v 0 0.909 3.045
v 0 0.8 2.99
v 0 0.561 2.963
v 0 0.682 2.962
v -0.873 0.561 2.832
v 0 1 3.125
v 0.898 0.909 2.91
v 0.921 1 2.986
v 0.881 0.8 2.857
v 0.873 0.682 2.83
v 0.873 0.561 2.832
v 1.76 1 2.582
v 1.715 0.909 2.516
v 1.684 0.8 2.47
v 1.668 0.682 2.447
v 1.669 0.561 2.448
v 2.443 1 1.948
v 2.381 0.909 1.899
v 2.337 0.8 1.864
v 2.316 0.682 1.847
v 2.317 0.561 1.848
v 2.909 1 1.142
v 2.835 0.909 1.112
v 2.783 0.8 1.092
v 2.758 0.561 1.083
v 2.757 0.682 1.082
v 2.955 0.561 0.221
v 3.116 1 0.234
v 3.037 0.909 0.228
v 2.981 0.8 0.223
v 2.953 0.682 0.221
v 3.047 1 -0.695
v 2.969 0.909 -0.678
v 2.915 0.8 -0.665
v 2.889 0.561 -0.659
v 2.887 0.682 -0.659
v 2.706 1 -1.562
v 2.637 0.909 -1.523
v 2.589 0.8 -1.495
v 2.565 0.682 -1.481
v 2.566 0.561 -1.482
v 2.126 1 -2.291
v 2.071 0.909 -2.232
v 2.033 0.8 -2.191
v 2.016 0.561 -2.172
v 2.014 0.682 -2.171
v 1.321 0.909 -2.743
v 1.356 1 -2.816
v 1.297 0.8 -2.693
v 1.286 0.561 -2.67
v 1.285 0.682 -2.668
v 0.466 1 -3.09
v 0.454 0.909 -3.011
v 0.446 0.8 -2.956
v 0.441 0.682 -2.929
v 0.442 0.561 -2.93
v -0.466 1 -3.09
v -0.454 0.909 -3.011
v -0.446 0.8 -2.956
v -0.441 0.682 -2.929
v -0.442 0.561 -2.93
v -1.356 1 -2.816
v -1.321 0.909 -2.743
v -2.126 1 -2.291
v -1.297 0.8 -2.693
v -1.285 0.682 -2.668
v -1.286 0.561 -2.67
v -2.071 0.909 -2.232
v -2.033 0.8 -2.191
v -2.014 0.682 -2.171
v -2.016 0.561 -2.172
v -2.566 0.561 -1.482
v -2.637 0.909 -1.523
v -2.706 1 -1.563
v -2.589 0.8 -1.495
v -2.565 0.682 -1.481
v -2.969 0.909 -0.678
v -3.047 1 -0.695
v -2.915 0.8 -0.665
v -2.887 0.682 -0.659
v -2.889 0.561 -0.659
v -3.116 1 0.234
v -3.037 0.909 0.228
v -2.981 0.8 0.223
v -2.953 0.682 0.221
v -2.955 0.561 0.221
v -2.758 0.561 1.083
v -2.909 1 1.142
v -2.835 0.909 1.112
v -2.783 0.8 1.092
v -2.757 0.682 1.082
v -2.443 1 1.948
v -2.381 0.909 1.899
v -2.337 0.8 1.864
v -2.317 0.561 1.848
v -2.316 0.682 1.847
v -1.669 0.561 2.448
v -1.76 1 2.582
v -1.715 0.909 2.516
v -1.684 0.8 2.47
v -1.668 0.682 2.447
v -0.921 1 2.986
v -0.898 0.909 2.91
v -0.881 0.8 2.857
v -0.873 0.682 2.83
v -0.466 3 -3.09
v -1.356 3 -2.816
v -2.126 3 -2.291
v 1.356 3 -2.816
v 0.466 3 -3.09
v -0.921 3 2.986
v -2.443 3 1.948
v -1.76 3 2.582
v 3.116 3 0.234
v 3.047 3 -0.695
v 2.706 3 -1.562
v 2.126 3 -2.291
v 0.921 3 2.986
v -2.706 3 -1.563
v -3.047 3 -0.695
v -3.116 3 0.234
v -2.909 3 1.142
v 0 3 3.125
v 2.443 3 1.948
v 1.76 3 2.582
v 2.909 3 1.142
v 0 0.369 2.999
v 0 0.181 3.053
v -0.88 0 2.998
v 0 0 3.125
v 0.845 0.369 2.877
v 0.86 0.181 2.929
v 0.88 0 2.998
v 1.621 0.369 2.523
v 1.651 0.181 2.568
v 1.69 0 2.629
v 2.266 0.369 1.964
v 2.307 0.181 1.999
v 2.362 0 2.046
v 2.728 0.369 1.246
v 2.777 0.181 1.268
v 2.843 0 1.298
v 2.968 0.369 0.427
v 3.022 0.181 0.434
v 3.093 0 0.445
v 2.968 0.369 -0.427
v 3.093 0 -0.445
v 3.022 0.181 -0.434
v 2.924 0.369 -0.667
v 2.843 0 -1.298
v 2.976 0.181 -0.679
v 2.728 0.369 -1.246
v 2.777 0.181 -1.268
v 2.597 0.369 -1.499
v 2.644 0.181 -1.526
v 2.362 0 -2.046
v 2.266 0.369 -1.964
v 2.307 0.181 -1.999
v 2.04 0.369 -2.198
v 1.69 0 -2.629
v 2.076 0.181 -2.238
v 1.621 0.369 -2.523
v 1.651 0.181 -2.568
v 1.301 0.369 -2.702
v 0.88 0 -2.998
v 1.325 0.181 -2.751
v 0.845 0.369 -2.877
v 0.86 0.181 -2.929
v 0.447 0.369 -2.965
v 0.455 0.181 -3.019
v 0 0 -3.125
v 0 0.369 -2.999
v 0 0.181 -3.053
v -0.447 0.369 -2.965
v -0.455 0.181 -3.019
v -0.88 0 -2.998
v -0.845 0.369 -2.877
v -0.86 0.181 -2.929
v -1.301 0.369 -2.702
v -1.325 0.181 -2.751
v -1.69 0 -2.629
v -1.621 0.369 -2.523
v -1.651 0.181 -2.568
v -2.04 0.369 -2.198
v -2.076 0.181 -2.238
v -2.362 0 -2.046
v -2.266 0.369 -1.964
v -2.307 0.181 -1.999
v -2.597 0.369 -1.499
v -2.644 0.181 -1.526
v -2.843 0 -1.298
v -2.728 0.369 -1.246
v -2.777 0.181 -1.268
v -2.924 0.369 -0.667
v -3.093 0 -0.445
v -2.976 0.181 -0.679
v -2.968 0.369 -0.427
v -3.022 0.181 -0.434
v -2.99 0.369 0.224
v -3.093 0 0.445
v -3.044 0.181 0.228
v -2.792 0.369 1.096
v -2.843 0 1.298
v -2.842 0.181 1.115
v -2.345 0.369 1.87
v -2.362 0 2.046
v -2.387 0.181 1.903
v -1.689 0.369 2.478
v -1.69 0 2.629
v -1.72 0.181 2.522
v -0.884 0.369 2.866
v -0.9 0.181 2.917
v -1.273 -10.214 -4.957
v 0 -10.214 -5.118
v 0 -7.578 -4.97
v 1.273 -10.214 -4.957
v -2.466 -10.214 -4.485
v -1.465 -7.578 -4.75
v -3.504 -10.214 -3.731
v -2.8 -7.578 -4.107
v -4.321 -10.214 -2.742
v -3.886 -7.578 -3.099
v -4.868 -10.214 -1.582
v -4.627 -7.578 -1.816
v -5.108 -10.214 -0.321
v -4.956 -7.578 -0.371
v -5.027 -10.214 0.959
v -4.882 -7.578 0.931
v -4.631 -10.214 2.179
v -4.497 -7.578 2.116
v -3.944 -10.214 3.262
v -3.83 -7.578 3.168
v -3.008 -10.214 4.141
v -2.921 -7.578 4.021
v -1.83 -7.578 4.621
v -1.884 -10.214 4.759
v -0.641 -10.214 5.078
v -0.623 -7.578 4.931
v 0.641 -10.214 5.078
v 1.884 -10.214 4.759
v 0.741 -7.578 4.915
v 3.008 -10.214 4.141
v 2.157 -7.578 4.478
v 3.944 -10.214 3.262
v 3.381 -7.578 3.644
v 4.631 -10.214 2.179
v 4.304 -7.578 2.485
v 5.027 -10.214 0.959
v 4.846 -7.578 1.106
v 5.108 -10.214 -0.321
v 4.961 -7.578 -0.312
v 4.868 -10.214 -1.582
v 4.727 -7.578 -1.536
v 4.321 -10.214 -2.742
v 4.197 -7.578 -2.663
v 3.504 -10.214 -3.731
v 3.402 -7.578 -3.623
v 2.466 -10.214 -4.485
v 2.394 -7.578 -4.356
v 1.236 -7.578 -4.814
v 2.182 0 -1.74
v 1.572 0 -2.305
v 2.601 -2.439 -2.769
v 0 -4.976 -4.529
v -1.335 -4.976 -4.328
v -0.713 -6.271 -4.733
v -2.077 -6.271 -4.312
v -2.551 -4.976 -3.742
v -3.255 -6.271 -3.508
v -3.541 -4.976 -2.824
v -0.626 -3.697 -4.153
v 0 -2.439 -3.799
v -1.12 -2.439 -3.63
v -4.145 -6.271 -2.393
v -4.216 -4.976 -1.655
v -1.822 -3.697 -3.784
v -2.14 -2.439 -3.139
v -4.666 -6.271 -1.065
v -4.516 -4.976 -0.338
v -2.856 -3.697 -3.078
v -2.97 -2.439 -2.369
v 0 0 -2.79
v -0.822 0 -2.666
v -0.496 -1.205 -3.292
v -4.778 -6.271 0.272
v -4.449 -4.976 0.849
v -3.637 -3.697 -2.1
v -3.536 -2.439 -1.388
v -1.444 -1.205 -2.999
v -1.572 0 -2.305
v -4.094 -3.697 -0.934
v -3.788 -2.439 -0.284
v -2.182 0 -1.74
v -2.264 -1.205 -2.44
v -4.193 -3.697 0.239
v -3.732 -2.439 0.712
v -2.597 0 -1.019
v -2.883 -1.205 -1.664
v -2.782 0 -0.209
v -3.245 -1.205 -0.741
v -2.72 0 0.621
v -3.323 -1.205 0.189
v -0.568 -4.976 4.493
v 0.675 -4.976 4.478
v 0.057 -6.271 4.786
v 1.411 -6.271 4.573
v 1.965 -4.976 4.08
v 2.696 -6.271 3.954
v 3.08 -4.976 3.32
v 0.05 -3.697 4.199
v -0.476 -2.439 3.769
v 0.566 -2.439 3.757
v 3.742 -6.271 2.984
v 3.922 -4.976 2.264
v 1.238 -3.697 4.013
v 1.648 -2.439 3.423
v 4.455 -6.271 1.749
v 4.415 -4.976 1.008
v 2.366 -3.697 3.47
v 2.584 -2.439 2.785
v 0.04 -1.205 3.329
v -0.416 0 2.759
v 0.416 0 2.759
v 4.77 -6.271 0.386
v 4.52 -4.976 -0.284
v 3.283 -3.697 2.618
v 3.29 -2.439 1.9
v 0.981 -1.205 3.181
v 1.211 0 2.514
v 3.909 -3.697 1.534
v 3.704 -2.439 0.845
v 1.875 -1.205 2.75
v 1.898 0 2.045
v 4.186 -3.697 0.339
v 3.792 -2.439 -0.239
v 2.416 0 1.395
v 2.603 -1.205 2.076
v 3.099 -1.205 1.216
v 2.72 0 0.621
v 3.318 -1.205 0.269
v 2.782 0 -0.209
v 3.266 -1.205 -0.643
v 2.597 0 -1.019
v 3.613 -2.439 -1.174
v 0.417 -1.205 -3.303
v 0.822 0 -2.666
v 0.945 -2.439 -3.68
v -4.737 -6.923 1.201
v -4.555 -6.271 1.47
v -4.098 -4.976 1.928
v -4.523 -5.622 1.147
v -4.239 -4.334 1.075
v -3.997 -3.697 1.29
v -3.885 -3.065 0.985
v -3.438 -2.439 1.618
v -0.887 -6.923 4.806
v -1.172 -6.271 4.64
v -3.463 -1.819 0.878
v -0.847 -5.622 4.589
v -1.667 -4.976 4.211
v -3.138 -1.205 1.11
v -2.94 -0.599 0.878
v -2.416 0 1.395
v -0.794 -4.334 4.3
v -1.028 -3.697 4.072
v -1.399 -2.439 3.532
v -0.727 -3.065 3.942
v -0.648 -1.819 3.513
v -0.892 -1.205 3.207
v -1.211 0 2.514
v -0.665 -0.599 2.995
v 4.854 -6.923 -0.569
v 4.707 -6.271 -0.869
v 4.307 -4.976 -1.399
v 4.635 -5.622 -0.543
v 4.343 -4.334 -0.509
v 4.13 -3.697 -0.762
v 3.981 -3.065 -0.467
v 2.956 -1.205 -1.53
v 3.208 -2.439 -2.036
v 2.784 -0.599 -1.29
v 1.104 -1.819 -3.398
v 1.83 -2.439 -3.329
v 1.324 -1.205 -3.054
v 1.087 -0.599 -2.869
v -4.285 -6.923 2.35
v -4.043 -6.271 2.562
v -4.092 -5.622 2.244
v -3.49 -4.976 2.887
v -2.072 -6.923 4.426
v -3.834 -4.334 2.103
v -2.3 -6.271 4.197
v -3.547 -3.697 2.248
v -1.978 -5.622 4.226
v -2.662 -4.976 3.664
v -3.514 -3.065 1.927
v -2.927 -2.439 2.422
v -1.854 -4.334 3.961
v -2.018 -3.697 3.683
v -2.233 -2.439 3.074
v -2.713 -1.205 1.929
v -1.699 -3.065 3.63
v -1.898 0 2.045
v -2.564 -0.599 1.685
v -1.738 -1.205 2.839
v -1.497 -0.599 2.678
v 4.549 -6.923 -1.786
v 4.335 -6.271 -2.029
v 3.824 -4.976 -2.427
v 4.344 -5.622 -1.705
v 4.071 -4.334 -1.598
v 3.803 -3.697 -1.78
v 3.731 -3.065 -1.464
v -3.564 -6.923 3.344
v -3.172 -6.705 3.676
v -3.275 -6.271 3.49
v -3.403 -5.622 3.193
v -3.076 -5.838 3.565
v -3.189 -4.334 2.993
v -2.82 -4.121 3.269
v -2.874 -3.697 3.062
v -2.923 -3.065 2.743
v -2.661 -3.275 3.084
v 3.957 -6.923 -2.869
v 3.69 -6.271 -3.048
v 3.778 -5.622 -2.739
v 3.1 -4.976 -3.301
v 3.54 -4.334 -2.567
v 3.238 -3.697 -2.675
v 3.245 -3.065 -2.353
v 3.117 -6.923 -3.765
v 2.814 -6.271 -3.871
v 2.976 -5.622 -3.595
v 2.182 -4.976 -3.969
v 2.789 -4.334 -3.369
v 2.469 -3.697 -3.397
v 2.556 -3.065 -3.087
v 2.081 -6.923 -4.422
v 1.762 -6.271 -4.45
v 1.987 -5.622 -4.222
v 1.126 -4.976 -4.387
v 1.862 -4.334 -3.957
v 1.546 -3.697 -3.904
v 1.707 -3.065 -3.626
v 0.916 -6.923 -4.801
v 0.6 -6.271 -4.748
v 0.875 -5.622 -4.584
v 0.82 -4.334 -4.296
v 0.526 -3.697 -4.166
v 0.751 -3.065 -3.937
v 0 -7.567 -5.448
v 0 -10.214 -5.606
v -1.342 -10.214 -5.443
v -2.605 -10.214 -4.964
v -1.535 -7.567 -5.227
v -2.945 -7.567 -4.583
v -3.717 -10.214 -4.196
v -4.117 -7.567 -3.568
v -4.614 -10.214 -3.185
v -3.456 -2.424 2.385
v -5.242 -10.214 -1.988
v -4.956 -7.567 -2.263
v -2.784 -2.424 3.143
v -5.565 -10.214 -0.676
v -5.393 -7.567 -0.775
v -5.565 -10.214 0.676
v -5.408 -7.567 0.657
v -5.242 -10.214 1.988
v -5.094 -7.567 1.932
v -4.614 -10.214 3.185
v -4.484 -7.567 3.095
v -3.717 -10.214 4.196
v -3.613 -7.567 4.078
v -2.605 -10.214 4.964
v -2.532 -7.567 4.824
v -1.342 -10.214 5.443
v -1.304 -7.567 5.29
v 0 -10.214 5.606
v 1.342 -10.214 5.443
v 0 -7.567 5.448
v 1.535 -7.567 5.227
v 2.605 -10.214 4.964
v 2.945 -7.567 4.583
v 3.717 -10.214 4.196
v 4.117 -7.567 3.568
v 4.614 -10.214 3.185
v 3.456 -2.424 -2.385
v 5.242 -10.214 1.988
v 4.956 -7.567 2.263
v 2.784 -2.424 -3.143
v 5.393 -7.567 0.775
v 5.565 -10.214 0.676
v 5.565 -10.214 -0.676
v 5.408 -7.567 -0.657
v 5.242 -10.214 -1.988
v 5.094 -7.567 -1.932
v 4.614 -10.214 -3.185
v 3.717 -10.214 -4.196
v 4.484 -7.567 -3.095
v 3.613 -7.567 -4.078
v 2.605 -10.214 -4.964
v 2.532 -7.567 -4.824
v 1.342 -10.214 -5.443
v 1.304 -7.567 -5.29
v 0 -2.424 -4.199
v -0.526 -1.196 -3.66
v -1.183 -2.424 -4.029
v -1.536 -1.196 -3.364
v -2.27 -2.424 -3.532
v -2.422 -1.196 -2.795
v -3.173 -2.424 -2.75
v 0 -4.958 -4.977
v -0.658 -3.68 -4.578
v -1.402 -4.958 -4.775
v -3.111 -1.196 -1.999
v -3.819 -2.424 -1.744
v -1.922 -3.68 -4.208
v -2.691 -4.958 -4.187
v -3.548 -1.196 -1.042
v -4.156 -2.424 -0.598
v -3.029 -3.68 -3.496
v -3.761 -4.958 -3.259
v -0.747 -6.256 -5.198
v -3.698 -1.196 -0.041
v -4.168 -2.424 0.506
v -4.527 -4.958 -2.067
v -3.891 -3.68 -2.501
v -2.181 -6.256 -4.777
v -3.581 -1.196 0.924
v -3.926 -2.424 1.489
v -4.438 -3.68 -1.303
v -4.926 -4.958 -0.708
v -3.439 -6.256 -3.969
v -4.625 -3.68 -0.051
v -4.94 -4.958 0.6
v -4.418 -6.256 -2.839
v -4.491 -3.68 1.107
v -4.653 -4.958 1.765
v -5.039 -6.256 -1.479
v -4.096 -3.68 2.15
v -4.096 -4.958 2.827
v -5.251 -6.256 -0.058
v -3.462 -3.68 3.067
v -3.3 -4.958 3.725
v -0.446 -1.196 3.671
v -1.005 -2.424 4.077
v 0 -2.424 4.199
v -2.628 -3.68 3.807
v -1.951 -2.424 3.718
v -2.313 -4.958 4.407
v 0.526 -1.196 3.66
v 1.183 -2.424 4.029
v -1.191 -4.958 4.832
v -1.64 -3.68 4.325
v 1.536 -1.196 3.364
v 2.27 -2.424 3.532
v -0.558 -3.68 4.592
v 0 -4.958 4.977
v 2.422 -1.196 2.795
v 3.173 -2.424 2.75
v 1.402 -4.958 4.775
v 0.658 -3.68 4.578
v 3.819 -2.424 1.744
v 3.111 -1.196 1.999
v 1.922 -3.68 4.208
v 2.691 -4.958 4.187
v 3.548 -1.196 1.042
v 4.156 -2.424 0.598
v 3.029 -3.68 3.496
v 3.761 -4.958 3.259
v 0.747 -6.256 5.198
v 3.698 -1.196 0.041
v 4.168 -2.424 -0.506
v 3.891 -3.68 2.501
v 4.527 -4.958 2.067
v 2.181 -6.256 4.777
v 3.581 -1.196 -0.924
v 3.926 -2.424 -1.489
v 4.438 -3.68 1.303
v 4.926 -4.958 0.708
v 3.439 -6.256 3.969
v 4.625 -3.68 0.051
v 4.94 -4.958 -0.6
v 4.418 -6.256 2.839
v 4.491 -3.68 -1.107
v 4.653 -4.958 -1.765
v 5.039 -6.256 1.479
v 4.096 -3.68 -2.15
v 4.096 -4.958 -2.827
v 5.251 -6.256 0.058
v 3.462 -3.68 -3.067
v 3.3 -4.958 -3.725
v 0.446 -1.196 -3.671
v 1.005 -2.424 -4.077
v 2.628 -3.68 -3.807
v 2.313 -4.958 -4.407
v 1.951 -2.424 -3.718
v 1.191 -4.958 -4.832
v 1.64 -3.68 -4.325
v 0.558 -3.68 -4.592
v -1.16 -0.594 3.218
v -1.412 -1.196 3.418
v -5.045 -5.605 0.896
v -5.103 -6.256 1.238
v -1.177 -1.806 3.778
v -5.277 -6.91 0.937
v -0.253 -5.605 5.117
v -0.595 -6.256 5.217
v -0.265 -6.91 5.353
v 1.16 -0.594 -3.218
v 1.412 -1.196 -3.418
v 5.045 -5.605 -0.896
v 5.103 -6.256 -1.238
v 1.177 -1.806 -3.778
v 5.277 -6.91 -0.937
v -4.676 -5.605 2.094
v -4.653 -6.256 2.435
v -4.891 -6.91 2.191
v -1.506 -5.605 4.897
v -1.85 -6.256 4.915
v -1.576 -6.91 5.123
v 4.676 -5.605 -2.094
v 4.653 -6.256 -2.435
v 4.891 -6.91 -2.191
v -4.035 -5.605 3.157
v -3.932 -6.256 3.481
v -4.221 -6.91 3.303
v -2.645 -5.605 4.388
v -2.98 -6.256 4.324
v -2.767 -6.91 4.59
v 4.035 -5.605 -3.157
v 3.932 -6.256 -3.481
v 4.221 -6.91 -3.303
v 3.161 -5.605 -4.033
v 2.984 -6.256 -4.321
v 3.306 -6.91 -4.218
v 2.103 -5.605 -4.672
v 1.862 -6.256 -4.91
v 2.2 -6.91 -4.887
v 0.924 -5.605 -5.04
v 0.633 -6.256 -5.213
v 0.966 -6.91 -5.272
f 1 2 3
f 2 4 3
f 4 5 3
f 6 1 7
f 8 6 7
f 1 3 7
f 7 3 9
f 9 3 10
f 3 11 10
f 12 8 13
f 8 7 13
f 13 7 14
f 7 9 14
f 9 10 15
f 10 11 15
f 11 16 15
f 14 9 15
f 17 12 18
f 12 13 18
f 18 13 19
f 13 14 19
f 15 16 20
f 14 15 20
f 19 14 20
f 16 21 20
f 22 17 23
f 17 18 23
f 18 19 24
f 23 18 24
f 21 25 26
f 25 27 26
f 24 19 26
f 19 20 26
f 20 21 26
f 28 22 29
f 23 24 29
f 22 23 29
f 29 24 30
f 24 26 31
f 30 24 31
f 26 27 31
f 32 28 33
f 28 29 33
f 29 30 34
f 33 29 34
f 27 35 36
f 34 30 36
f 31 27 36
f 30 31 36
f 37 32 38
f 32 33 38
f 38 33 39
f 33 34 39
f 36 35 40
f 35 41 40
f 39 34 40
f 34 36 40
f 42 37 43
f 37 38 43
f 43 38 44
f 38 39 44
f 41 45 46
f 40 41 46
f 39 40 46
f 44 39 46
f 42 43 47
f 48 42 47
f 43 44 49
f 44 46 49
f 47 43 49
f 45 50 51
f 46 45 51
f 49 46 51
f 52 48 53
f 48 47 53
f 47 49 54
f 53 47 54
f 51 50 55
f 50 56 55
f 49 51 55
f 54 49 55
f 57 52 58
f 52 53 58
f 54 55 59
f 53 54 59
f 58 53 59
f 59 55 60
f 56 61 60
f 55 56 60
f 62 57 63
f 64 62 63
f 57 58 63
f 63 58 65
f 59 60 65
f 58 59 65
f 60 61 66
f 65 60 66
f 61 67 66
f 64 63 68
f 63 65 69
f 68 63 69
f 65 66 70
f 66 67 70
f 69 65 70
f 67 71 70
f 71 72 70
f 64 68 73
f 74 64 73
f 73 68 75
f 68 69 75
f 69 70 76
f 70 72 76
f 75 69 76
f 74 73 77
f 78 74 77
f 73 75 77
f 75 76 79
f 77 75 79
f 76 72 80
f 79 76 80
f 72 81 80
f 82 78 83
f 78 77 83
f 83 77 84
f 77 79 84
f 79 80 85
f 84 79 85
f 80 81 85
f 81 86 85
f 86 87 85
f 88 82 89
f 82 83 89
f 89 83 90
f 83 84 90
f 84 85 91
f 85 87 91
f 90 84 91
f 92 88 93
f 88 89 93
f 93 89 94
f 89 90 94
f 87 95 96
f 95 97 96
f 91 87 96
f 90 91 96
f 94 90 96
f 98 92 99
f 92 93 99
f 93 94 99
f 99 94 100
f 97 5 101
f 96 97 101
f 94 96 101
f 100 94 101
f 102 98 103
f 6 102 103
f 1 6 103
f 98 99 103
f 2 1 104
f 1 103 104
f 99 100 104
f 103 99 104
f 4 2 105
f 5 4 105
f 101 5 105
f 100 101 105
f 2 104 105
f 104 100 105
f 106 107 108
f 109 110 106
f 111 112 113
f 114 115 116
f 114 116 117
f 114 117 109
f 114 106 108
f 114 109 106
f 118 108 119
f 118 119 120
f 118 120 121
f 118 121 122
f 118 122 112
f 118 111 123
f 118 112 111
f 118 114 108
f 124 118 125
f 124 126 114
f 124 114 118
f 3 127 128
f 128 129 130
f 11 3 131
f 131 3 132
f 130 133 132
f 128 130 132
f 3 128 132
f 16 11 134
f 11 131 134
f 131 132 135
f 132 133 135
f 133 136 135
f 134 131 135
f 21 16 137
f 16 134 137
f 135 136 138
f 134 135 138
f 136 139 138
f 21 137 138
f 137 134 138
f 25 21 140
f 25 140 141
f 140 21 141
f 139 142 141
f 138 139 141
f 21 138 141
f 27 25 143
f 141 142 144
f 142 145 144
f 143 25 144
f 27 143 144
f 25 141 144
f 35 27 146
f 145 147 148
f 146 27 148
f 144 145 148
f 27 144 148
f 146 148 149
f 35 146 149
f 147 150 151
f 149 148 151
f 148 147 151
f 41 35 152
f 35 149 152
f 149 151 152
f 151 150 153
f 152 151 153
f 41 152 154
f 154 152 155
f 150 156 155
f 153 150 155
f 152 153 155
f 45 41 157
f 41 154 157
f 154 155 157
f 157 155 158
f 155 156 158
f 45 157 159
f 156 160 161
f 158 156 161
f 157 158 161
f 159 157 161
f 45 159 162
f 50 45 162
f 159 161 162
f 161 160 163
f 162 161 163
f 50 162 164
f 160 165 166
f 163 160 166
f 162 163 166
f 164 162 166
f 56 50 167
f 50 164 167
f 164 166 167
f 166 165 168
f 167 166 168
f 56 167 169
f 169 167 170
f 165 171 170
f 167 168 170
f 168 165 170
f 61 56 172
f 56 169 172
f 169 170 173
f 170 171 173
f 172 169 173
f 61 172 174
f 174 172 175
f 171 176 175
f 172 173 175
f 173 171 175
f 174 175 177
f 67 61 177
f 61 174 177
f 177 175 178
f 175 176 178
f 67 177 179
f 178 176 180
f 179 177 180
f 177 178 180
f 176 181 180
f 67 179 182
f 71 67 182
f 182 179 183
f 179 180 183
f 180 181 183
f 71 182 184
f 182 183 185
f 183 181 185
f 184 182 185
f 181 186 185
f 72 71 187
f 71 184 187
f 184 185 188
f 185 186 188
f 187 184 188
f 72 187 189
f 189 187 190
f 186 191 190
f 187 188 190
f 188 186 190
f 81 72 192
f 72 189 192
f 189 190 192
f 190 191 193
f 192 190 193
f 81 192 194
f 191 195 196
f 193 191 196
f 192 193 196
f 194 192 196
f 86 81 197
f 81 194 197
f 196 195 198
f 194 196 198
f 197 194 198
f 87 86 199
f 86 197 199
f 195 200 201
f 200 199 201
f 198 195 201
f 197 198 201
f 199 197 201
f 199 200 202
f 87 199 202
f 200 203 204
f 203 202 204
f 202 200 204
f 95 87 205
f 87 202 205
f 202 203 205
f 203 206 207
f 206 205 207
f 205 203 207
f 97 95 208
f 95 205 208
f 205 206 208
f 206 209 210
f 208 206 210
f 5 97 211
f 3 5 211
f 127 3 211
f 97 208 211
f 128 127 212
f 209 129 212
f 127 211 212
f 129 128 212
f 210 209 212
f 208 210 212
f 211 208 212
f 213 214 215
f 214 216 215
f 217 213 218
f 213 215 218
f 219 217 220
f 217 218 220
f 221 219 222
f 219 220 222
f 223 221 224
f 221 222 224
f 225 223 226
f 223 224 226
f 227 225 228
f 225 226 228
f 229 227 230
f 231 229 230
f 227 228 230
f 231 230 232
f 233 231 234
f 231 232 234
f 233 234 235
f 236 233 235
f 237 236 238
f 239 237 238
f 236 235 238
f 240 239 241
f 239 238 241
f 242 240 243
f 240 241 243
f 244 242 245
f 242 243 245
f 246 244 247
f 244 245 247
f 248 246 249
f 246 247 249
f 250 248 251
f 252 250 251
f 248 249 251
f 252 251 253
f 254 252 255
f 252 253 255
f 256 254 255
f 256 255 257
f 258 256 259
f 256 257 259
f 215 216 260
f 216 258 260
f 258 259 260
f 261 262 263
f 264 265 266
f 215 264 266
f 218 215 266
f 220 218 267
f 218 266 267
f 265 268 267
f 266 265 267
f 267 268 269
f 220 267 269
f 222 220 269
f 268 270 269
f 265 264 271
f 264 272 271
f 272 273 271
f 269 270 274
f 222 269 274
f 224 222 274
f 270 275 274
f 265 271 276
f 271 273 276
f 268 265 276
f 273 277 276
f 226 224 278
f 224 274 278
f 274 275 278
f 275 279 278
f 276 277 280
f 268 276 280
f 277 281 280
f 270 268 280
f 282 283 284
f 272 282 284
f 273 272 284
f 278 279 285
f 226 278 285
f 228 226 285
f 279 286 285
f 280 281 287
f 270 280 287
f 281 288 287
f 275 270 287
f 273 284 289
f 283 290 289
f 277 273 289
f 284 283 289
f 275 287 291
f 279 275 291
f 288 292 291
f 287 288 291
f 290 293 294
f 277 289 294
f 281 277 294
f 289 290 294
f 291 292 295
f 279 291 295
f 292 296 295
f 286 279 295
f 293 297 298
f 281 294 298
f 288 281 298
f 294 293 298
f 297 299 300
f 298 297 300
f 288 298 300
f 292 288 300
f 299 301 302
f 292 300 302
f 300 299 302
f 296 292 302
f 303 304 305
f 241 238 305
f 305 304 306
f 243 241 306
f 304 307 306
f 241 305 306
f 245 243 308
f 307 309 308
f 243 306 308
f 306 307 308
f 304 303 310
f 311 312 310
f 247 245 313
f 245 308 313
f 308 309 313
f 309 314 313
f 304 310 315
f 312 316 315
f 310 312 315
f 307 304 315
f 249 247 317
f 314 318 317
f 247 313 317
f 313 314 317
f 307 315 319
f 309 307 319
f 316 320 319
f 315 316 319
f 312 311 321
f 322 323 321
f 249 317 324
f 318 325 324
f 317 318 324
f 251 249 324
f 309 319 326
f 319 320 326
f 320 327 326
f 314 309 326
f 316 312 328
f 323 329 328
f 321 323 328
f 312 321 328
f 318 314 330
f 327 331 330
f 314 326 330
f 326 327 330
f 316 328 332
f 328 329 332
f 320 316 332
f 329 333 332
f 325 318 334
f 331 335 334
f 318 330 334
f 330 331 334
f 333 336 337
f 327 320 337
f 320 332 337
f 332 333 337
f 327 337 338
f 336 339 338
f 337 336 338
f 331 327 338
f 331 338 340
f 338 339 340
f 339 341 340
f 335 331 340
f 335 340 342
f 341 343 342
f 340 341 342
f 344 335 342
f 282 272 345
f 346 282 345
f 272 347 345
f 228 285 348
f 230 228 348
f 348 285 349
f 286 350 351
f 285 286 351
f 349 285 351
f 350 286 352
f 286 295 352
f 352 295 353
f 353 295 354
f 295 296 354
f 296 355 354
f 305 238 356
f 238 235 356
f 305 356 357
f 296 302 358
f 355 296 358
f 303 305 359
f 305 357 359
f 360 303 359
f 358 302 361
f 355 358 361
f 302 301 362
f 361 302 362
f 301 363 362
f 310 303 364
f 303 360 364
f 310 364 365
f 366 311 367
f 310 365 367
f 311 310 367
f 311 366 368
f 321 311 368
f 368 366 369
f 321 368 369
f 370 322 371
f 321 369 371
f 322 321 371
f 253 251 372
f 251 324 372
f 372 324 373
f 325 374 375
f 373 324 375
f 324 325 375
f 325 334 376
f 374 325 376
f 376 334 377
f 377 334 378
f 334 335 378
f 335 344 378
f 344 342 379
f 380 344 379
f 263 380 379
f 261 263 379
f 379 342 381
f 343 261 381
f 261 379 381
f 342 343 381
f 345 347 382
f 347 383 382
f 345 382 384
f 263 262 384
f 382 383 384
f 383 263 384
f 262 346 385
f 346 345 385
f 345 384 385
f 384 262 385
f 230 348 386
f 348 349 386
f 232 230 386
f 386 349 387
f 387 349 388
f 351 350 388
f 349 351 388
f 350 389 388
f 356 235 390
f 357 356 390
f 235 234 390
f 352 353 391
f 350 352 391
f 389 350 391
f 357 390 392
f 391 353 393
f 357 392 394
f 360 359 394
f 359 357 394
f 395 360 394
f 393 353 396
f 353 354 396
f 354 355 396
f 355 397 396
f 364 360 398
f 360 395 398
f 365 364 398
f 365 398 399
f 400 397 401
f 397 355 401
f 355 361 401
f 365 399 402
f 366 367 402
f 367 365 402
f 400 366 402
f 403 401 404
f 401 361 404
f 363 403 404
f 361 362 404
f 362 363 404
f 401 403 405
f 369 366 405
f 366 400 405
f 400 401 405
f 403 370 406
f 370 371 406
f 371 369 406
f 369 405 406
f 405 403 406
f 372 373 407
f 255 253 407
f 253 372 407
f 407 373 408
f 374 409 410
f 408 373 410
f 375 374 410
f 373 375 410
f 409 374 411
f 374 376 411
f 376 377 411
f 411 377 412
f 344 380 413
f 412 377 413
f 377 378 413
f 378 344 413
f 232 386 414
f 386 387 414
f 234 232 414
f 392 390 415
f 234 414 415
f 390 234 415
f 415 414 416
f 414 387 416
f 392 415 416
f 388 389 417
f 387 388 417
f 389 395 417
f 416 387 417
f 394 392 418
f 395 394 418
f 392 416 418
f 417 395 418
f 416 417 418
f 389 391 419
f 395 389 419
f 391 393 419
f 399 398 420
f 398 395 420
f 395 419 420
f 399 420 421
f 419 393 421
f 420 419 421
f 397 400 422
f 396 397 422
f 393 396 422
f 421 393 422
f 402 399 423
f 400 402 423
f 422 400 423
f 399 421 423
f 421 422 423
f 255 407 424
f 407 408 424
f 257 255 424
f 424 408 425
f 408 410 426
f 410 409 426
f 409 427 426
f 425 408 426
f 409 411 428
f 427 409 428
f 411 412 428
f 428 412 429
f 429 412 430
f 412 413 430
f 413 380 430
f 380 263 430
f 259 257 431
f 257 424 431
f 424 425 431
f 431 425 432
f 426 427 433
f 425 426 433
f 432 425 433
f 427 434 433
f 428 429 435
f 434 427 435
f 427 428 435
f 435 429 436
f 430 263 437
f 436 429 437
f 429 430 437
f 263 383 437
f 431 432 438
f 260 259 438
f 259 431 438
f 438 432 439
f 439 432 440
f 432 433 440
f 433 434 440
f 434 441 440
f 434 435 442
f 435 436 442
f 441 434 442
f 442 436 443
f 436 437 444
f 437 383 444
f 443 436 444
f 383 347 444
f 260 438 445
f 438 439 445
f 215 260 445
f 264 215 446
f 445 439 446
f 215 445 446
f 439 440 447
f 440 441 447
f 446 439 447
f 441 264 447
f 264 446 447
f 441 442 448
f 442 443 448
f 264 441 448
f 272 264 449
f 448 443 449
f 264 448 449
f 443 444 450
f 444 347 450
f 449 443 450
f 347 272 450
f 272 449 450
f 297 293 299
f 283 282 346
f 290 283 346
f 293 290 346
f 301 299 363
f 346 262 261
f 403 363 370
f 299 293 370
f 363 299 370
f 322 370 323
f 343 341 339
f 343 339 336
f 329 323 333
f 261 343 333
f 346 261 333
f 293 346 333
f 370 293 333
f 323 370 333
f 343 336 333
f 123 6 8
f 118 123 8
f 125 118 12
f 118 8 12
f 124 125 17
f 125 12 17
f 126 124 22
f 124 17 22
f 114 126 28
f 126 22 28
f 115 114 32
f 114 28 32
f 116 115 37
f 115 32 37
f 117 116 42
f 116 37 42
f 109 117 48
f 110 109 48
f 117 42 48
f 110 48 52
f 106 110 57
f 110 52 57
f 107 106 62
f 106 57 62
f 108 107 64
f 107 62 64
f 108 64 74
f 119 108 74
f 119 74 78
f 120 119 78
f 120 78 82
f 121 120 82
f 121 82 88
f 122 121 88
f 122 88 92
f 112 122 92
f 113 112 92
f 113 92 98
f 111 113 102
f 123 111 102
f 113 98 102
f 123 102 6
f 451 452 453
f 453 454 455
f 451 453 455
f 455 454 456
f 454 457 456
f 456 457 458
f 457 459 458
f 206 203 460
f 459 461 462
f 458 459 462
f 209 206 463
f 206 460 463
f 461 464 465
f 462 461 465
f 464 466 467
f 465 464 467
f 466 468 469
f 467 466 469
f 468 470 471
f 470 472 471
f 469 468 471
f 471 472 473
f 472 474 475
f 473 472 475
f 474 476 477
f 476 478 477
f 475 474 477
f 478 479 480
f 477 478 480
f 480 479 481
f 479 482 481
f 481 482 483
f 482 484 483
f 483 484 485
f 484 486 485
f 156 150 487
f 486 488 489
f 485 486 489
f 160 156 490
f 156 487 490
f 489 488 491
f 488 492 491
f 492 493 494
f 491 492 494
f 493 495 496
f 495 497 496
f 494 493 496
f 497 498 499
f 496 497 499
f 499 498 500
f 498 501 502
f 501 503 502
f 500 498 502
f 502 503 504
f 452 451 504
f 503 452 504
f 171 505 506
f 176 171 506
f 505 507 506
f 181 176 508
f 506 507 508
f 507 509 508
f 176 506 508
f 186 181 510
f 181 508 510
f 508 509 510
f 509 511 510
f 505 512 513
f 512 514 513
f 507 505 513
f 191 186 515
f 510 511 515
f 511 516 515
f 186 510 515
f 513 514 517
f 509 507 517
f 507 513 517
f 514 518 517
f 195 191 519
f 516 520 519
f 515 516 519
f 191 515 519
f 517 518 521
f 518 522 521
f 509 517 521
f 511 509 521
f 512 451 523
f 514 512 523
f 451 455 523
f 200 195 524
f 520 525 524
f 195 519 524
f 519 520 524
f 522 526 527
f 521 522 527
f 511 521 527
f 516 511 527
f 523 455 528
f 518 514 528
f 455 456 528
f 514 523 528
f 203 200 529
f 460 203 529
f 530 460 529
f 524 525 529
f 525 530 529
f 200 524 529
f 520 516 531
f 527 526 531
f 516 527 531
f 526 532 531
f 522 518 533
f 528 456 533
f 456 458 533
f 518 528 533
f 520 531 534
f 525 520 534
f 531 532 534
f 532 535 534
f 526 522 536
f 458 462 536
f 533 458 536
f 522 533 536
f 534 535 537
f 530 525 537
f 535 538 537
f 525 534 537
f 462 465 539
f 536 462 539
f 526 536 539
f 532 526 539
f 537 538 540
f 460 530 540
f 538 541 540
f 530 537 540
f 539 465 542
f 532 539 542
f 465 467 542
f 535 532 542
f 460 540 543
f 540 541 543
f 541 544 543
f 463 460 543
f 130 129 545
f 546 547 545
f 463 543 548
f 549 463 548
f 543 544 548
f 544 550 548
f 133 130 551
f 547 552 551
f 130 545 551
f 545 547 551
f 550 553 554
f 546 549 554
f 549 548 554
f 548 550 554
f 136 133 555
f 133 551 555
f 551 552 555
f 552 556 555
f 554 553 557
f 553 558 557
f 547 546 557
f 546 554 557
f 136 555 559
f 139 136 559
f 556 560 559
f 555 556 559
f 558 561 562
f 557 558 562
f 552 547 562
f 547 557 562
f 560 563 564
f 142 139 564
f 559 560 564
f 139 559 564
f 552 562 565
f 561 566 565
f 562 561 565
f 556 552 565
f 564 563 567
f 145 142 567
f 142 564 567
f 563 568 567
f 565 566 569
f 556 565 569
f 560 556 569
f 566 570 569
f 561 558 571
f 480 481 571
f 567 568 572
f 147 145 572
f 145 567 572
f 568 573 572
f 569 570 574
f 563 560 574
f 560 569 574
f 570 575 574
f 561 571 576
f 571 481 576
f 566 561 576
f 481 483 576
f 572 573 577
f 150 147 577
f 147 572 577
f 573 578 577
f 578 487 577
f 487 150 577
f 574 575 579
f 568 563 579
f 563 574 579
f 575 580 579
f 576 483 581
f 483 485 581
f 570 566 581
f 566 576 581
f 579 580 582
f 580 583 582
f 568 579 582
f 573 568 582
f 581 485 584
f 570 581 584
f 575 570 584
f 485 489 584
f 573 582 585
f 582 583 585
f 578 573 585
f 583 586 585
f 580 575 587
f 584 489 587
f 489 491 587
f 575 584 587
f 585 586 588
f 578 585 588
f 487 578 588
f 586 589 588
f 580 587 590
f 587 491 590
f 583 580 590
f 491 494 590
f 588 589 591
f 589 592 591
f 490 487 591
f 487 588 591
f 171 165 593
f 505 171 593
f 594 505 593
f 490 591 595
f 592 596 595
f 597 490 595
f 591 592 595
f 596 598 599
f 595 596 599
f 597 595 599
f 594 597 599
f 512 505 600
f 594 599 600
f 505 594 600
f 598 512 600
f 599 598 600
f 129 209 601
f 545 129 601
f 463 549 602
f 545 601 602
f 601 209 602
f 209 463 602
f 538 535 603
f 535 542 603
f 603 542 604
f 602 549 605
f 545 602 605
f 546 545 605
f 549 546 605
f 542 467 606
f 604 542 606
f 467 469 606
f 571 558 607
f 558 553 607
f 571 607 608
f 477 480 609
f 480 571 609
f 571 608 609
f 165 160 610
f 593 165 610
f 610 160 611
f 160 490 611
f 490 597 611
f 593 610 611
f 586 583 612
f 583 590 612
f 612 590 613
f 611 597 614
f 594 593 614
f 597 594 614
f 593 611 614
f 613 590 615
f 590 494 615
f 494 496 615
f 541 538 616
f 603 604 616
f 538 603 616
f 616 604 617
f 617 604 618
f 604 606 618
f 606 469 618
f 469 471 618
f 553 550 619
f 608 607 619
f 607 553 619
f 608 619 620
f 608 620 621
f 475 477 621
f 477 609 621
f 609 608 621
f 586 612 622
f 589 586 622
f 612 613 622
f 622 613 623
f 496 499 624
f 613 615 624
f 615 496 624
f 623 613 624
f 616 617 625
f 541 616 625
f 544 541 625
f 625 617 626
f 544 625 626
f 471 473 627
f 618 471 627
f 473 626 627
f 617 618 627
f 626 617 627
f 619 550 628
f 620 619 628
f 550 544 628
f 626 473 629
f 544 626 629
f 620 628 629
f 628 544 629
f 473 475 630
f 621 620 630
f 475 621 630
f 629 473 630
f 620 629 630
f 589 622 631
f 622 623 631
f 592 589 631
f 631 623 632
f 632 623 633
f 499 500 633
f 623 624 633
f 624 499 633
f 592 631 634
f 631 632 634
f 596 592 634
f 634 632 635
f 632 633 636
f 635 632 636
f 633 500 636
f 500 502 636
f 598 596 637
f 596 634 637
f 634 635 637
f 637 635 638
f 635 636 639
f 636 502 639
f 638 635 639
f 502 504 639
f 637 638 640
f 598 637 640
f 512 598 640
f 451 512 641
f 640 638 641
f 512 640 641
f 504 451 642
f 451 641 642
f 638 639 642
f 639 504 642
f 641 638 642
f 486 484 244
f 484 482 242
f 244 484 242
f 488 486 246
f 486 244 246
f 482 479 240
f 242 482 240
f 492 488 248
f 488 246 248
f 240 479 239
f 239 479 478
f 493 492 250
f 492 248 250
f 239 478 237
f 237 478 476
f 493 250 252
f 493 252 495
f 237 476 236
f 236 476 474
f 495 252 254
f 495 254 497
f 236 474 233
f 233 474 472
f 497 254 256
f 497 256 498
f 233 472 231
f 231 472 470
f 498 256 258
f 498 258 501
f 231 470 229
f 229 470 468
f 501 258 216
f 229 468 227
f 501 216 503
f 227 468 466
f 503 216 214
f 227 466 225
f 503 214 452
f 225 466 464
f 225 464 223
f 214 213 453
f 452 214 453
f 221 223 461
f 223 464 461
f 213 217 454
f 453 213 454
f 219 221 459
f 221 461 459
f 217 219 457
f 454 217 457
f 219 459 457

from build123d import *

# Parameters (mm, degrees)
SKETCH2_R           = 2.945157041
BOSS_EXTRUDE1_DEPTH = 1
SKETCH3_R           = 3.125
BOSS_EXTRUDE2_DEPTH = 2
FILLET1_R           = 2
FILLET2_R           = 0.5


with BuildPart() as part:
    # Sketch1 → Revolve1 (revolve)
    with BuildSketch(Plane.XY, mode=Mode.PRIVATE) as revolve1_sk:
        with BuildLine():
            Line((2.790292922, 0), (3.125, 0))
            ThreePointArc((3.125, 0), (4.976777415, -4.958274435), (5.60588742, -10.213537089))
            Line((5.60588742, -10.213537089), (5.11812749, -10.213537089))
            ThreePointArc((5.11812749, -10.213537089), (4.52880139, -4.97580968), (2.790292922, 0))
        make_face()
    revolve(revolve1_sk.sketch.rotate(Axis((0, -10.213537089, 0), (0, 1, 0)), 90), axis=Axis((0, -10.213537089, 0), (0, 1, 0)))

    # Sketch2 → Boss-Extrude1 (add)
    with BuildSketch(Plane(origin=(0, 0, 0), x_dir=(1, 0, 0), z_dir=(0, 1, 0))):
        with Locations(Location((0, 0, 0), (0, 0, 270))):
            Circle(SKETCH2_R)
    extrude(amount=BOSS_EXTRUDE1_DEPTH)

    # Sketch3 → Boss-Extrude2 (add)
    with BuildSketch(Plane(origin=(0, 1, 0), x_dir=(1, 0, 0), z_dir=(0, 1, 0))):
        with Locations(Location((0, 0, 0), (0, 0, 270))):
            Circle(SKETCH3_R)
    extrude(amount=BOSS_EXTRUDE2_DEPTH)

    # Fillet1
    # the kernel refuses this fillet: 2 mm, written as the material it adds along each edge
    with BuildSketch(Plane(origin=(0, 0, 0), x_dir=(0, 0, 1), z_dir=(-1, 0, 0))) as fillet1_piece_1:
        with BuildLine():
            CenterArc((4.945157041, 0.828871731), FILLET1_R, 180, 24.483795265)
            Line((3.125, 0), (2.945157041, 0))
            Line((2.945157041, 0), (2.945157041, 0.828871731))
        make_face()
    revolve(axis=Axis((0, 0, 0), (0, 1, 0)))

    # Fillet2
    # the kernel refuses this fillet: 0.5 mm, written as the material it adds along each edge
    with BuildSketch(Plane(origin=(0, 1, 0), x_dir=(0, 0, 1), z_dir=(-1, 0, 0))) as fillet2_piece_1:
        with BuildLine():
            CenterArc((3.458713381, -0.372337723), FILLET2_R, 131.868770298, 55.840101838)
            Line((3.125, 0), (3.091628662, 0.037233772))
            ThreePointArc((3.091628662, 0.037233772), (3.035078521, 0.05), (2.945157041, 0.05))
            Line((2.945157041, 0.05), (2.895157041, 0))
            ThreePointArc((2.895157041, 0), (2.895157041, -0.171128269), (2.913684038, -0.446114522))
            Line((2.913684038, -0.446114522), (2.96323216, -0.43940754))
        make_face()
    revolve(axis=Axis((0, 1, 0), (0, 1, 0)))


solid = part.part
